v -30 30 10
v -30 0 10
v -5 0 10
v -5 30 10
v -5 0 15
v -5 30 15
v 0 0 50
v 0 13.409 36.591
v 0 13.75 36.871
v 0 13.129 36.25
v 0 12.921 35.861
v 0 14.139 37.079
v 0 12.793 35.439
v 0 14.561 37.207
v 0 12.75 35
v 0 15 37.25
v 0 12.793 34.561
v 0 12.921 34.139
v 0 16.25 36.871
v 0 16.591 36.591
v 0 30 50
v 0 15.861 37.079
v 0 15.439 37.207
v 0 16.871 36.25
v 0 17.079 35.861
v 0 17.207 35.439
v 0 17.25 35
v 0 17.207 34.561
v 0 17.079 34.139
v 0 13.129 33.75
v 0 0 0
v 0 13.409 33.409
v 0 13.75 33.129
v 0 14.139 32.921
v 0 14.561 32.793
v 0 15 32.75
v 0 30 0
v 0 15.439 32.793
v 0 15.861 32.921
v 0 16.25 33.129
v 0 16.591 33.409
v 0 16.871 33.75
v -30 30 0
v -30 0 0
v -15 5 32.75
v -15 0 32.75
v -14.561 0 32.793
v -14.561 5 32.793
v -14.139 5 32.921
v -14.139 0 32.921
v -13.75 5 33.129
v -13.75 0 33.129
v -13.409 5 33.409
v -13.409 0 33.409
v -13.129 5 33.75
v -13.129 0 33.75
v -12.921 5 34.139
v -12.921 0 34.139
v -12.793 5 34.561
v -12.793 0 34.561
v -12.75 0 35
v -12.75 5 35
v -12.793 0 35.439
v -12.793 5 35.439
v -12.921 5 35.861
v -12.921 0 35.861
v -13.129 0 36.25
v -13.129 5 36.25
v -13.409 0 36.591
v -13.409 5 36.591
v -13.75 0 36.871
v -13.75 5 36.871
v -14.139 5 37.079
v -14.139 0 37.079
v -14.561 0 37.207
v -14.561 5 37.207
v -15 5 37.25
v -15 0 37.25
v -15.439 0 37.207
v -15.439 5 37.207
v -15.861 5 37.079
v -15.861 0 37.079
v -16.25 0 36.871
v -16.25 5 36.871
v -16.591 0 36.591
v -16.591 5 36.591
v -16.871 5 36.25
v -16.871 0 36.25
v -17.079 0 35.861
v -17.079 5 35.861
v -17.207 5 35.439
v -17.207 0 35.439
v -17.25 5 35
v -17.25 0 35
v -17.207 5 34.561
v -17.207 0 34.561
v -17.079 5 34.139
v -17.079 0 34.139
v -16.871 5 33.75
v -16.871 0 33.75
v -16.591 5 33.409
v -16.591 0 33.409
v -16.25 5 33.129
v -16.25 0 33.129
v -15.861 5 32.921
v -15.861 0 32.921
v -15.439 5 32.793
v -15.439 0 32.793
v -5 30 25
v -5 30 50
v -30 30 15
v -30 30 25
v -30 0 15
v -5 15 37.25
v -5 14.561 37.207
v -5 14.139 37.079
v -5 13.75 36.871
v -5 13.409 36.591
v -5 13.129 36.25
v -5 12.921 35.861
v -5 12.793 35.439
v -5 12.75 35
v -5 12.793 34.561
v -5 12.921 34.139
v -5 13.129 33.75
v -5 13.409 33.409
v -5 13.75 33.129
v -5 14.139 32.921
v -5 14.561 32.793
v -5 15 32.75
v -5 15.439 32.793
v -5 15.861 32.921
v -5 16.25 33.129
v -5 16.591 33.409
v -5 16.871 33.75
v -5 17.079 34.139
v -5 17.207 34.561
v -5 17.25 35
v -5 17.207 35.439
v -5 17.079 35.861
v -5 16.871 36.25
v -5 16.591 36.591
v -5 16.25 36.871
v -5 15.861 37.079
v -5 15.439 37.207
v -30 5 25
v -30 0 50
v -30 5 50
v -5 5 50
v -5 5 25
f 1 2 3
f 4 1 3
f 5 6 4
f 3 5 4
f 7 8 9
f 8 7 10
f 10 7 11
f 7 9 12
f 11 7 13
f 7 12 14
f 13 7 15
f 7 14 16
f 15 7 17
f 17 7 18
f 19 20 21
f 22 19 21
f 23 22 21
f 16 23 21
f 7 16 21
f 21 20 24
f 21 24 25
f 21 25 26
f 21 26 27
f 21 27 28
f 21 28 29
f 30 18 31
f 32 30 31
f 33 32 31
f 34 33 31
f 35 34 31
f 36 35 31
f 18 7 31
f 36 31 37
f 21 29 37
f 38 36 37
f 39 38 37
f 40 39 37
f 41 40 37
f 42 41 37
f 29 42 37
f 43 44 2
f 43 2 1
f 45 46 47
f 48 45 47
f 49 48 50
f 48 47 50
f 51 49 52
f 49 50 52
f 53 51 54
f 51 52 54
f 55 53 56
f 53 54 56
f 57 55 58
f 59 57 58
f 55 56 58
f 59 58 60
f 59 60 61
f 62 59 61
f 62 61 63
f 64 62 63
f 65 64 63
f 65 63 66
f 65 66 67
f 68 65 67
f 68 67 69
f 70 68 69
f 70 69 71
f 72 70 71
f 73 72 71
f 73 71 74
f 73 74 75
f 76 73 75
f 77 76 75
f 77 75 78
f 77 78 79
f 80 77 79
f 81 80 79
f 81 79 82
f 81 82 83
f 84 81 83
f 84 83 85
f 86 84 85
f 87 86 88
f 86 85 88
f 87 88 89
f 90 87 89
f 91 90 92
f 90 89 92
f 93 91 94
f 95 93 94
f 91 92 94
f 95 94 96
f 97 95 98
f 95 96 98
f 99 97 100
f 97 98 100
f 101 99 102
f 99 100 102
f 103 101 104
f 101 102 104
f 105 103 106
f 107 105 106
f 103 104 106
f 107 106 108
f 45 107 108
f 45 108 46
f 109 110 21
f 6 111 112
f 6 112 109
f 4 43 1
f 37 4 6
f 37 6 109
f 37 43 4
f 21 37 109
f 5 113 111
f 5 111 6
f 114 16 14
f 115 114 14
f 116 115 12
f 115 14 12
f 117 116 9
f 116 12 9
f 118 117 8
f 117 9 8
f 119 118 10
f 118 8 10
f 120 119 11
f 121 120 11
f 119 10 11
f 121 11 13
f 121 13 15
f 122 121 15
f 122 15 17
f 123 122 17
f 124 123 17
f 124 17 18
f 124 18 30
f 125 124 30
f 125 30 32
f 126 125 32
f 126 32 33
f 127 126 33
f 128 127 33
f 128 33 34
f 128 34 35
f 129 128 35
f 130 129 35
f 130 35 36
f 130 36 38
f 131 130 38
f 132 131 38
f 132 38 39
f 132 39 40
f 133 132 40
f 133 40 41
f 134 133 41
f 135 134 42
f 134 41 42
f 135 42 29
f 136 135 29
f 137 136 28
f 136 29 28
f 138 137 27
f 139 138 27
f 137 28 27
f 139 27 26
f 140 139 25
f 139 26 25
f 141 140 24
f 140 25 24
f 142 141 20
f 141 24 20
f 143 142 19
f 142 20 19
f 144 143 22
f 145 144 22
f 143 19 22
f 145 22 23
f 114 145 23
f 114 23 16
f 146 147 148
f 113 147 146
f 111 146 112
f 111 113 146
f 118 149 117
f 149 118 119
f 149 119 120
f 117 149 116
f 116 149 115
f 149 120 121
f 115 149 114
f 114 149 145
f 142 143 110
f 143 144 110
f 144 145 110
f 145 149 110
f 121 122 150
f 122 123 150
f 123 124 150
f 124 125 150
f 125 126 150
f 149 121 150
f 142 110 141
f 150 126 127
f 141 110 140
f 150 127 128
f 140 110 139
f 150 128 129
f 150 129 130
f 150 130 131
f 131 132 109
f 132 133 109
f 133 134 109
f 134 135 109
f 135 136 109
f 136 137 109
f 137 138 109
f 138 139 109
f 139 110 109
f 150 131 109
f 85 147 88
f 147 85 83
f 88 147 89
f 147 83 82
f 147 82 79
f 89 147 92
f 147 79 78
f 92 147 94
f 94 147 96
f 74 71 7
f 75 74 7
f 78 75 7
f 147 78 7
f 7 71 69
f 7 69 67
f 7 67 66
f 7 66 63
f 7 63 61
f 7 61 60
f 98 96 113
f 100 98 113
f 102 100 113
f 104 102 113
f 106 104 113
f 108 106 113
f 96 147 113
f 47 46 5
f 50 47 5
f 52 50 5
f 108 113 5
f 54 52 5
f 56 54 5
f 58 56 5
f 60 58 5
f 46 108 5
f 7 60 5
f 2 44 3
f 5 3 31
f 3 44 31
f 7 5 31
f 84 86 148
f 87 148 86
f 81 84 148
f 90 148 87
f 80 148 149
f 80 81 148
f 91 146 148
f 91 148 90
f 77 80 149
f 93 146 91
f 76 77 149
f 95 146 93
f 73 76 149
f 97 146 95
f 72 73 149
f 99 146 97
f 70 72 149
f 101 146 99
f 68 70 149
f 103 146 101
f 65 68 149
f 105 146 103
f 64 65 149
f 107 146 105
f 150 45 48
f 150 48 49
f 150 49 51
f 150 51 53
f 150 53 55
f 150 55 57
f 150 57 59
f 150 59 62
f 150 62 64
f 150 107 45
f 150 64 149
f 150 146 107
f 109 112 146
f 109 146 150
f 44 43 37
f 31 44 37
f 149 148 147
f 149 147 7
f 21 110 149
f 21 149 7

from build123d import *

# Parameters (mm, degrees)
ESBO_O1_W                         = 30
ESBO_O1_H                         = 30
RESSALTO_EXTRUS_O1_DEPTH          = 50
ESBO_O2_W                         = 25
ESBO_O2_H                         = 5
CORTE_EXTRUS_O1_DEPTH             = 31
ESBO_O3_W                         = 25
ESBO_O3_H                         = 25
CORTE_EXTRUS_O2_DEPTH             = 25
FURO_COM_FOLGA_DE_M41_D           = 4.5
FURO_COM_FOLGA_DE_M41_ON_FACE_2_D = 4.5


with BuildPart() as part:
    # Esboço1 → Ressalto-extrusão1 (new body)
    with BuildSketch(Plane.XY):
        with Locations((-15, 15)):
            Rectangle(ESBO_O1_W, ESBO_O1_H)
    extrude(amount=RESSALTO_EXTRUS_O1_DEPTH)

    # Esboço2 → Corte-extrusão1 (cut, through all)
    with BuildSketch(Plane(origin=(0, 30, 0), x_dir=(1, 0, 0), z_dir=(0, 1, 0))):
        with Locations((-17.5, -12.5)):
            Rectangle(ESBO_O2_W, ESBO_O2_H)
    extrude(amount=-CORTE_EXTRUS_O1_DEPTH, mode=Mode.SUBTRACT)

    # Esboço3 → Corte-extrusão2 (cut)
    with BuildSketch(Plane(origin=(0, 30, 0), x_dir=(1, 0, 0), z_dir=(0, 1, 0))):
        with Locations((-17.5, -37.5)):
            Rectangle(ESBO_O3_W, ESBO_O3_H)
    extrude(amount=-CORTE_EXTRUS_O2_DEPTH, mode=Mode.SUBTRACT)

    # Furo com folga de M41 (through all)
    with Locations(Plane(origin=(-15, 5, 35), x_dir=(0, 0, 1), z_dir=(0, 1, 0))):
        with Locations((0, 0)):
            Hole(FURO_COM_FOLGA_DE_M41_D / 2)

    # Furo com folga de M41 on face 2 (through all)
    with Locations(Plane(origin=(-5, 15, 35), x_dir=(0, 0, -1), z_dir=(-1, 0, 0))):
        with Locations((0, 0)):
            Hole(FURO_COM_FOLGA_DE_M41_ON_FACE_2_D / 2)


solid = part.part
